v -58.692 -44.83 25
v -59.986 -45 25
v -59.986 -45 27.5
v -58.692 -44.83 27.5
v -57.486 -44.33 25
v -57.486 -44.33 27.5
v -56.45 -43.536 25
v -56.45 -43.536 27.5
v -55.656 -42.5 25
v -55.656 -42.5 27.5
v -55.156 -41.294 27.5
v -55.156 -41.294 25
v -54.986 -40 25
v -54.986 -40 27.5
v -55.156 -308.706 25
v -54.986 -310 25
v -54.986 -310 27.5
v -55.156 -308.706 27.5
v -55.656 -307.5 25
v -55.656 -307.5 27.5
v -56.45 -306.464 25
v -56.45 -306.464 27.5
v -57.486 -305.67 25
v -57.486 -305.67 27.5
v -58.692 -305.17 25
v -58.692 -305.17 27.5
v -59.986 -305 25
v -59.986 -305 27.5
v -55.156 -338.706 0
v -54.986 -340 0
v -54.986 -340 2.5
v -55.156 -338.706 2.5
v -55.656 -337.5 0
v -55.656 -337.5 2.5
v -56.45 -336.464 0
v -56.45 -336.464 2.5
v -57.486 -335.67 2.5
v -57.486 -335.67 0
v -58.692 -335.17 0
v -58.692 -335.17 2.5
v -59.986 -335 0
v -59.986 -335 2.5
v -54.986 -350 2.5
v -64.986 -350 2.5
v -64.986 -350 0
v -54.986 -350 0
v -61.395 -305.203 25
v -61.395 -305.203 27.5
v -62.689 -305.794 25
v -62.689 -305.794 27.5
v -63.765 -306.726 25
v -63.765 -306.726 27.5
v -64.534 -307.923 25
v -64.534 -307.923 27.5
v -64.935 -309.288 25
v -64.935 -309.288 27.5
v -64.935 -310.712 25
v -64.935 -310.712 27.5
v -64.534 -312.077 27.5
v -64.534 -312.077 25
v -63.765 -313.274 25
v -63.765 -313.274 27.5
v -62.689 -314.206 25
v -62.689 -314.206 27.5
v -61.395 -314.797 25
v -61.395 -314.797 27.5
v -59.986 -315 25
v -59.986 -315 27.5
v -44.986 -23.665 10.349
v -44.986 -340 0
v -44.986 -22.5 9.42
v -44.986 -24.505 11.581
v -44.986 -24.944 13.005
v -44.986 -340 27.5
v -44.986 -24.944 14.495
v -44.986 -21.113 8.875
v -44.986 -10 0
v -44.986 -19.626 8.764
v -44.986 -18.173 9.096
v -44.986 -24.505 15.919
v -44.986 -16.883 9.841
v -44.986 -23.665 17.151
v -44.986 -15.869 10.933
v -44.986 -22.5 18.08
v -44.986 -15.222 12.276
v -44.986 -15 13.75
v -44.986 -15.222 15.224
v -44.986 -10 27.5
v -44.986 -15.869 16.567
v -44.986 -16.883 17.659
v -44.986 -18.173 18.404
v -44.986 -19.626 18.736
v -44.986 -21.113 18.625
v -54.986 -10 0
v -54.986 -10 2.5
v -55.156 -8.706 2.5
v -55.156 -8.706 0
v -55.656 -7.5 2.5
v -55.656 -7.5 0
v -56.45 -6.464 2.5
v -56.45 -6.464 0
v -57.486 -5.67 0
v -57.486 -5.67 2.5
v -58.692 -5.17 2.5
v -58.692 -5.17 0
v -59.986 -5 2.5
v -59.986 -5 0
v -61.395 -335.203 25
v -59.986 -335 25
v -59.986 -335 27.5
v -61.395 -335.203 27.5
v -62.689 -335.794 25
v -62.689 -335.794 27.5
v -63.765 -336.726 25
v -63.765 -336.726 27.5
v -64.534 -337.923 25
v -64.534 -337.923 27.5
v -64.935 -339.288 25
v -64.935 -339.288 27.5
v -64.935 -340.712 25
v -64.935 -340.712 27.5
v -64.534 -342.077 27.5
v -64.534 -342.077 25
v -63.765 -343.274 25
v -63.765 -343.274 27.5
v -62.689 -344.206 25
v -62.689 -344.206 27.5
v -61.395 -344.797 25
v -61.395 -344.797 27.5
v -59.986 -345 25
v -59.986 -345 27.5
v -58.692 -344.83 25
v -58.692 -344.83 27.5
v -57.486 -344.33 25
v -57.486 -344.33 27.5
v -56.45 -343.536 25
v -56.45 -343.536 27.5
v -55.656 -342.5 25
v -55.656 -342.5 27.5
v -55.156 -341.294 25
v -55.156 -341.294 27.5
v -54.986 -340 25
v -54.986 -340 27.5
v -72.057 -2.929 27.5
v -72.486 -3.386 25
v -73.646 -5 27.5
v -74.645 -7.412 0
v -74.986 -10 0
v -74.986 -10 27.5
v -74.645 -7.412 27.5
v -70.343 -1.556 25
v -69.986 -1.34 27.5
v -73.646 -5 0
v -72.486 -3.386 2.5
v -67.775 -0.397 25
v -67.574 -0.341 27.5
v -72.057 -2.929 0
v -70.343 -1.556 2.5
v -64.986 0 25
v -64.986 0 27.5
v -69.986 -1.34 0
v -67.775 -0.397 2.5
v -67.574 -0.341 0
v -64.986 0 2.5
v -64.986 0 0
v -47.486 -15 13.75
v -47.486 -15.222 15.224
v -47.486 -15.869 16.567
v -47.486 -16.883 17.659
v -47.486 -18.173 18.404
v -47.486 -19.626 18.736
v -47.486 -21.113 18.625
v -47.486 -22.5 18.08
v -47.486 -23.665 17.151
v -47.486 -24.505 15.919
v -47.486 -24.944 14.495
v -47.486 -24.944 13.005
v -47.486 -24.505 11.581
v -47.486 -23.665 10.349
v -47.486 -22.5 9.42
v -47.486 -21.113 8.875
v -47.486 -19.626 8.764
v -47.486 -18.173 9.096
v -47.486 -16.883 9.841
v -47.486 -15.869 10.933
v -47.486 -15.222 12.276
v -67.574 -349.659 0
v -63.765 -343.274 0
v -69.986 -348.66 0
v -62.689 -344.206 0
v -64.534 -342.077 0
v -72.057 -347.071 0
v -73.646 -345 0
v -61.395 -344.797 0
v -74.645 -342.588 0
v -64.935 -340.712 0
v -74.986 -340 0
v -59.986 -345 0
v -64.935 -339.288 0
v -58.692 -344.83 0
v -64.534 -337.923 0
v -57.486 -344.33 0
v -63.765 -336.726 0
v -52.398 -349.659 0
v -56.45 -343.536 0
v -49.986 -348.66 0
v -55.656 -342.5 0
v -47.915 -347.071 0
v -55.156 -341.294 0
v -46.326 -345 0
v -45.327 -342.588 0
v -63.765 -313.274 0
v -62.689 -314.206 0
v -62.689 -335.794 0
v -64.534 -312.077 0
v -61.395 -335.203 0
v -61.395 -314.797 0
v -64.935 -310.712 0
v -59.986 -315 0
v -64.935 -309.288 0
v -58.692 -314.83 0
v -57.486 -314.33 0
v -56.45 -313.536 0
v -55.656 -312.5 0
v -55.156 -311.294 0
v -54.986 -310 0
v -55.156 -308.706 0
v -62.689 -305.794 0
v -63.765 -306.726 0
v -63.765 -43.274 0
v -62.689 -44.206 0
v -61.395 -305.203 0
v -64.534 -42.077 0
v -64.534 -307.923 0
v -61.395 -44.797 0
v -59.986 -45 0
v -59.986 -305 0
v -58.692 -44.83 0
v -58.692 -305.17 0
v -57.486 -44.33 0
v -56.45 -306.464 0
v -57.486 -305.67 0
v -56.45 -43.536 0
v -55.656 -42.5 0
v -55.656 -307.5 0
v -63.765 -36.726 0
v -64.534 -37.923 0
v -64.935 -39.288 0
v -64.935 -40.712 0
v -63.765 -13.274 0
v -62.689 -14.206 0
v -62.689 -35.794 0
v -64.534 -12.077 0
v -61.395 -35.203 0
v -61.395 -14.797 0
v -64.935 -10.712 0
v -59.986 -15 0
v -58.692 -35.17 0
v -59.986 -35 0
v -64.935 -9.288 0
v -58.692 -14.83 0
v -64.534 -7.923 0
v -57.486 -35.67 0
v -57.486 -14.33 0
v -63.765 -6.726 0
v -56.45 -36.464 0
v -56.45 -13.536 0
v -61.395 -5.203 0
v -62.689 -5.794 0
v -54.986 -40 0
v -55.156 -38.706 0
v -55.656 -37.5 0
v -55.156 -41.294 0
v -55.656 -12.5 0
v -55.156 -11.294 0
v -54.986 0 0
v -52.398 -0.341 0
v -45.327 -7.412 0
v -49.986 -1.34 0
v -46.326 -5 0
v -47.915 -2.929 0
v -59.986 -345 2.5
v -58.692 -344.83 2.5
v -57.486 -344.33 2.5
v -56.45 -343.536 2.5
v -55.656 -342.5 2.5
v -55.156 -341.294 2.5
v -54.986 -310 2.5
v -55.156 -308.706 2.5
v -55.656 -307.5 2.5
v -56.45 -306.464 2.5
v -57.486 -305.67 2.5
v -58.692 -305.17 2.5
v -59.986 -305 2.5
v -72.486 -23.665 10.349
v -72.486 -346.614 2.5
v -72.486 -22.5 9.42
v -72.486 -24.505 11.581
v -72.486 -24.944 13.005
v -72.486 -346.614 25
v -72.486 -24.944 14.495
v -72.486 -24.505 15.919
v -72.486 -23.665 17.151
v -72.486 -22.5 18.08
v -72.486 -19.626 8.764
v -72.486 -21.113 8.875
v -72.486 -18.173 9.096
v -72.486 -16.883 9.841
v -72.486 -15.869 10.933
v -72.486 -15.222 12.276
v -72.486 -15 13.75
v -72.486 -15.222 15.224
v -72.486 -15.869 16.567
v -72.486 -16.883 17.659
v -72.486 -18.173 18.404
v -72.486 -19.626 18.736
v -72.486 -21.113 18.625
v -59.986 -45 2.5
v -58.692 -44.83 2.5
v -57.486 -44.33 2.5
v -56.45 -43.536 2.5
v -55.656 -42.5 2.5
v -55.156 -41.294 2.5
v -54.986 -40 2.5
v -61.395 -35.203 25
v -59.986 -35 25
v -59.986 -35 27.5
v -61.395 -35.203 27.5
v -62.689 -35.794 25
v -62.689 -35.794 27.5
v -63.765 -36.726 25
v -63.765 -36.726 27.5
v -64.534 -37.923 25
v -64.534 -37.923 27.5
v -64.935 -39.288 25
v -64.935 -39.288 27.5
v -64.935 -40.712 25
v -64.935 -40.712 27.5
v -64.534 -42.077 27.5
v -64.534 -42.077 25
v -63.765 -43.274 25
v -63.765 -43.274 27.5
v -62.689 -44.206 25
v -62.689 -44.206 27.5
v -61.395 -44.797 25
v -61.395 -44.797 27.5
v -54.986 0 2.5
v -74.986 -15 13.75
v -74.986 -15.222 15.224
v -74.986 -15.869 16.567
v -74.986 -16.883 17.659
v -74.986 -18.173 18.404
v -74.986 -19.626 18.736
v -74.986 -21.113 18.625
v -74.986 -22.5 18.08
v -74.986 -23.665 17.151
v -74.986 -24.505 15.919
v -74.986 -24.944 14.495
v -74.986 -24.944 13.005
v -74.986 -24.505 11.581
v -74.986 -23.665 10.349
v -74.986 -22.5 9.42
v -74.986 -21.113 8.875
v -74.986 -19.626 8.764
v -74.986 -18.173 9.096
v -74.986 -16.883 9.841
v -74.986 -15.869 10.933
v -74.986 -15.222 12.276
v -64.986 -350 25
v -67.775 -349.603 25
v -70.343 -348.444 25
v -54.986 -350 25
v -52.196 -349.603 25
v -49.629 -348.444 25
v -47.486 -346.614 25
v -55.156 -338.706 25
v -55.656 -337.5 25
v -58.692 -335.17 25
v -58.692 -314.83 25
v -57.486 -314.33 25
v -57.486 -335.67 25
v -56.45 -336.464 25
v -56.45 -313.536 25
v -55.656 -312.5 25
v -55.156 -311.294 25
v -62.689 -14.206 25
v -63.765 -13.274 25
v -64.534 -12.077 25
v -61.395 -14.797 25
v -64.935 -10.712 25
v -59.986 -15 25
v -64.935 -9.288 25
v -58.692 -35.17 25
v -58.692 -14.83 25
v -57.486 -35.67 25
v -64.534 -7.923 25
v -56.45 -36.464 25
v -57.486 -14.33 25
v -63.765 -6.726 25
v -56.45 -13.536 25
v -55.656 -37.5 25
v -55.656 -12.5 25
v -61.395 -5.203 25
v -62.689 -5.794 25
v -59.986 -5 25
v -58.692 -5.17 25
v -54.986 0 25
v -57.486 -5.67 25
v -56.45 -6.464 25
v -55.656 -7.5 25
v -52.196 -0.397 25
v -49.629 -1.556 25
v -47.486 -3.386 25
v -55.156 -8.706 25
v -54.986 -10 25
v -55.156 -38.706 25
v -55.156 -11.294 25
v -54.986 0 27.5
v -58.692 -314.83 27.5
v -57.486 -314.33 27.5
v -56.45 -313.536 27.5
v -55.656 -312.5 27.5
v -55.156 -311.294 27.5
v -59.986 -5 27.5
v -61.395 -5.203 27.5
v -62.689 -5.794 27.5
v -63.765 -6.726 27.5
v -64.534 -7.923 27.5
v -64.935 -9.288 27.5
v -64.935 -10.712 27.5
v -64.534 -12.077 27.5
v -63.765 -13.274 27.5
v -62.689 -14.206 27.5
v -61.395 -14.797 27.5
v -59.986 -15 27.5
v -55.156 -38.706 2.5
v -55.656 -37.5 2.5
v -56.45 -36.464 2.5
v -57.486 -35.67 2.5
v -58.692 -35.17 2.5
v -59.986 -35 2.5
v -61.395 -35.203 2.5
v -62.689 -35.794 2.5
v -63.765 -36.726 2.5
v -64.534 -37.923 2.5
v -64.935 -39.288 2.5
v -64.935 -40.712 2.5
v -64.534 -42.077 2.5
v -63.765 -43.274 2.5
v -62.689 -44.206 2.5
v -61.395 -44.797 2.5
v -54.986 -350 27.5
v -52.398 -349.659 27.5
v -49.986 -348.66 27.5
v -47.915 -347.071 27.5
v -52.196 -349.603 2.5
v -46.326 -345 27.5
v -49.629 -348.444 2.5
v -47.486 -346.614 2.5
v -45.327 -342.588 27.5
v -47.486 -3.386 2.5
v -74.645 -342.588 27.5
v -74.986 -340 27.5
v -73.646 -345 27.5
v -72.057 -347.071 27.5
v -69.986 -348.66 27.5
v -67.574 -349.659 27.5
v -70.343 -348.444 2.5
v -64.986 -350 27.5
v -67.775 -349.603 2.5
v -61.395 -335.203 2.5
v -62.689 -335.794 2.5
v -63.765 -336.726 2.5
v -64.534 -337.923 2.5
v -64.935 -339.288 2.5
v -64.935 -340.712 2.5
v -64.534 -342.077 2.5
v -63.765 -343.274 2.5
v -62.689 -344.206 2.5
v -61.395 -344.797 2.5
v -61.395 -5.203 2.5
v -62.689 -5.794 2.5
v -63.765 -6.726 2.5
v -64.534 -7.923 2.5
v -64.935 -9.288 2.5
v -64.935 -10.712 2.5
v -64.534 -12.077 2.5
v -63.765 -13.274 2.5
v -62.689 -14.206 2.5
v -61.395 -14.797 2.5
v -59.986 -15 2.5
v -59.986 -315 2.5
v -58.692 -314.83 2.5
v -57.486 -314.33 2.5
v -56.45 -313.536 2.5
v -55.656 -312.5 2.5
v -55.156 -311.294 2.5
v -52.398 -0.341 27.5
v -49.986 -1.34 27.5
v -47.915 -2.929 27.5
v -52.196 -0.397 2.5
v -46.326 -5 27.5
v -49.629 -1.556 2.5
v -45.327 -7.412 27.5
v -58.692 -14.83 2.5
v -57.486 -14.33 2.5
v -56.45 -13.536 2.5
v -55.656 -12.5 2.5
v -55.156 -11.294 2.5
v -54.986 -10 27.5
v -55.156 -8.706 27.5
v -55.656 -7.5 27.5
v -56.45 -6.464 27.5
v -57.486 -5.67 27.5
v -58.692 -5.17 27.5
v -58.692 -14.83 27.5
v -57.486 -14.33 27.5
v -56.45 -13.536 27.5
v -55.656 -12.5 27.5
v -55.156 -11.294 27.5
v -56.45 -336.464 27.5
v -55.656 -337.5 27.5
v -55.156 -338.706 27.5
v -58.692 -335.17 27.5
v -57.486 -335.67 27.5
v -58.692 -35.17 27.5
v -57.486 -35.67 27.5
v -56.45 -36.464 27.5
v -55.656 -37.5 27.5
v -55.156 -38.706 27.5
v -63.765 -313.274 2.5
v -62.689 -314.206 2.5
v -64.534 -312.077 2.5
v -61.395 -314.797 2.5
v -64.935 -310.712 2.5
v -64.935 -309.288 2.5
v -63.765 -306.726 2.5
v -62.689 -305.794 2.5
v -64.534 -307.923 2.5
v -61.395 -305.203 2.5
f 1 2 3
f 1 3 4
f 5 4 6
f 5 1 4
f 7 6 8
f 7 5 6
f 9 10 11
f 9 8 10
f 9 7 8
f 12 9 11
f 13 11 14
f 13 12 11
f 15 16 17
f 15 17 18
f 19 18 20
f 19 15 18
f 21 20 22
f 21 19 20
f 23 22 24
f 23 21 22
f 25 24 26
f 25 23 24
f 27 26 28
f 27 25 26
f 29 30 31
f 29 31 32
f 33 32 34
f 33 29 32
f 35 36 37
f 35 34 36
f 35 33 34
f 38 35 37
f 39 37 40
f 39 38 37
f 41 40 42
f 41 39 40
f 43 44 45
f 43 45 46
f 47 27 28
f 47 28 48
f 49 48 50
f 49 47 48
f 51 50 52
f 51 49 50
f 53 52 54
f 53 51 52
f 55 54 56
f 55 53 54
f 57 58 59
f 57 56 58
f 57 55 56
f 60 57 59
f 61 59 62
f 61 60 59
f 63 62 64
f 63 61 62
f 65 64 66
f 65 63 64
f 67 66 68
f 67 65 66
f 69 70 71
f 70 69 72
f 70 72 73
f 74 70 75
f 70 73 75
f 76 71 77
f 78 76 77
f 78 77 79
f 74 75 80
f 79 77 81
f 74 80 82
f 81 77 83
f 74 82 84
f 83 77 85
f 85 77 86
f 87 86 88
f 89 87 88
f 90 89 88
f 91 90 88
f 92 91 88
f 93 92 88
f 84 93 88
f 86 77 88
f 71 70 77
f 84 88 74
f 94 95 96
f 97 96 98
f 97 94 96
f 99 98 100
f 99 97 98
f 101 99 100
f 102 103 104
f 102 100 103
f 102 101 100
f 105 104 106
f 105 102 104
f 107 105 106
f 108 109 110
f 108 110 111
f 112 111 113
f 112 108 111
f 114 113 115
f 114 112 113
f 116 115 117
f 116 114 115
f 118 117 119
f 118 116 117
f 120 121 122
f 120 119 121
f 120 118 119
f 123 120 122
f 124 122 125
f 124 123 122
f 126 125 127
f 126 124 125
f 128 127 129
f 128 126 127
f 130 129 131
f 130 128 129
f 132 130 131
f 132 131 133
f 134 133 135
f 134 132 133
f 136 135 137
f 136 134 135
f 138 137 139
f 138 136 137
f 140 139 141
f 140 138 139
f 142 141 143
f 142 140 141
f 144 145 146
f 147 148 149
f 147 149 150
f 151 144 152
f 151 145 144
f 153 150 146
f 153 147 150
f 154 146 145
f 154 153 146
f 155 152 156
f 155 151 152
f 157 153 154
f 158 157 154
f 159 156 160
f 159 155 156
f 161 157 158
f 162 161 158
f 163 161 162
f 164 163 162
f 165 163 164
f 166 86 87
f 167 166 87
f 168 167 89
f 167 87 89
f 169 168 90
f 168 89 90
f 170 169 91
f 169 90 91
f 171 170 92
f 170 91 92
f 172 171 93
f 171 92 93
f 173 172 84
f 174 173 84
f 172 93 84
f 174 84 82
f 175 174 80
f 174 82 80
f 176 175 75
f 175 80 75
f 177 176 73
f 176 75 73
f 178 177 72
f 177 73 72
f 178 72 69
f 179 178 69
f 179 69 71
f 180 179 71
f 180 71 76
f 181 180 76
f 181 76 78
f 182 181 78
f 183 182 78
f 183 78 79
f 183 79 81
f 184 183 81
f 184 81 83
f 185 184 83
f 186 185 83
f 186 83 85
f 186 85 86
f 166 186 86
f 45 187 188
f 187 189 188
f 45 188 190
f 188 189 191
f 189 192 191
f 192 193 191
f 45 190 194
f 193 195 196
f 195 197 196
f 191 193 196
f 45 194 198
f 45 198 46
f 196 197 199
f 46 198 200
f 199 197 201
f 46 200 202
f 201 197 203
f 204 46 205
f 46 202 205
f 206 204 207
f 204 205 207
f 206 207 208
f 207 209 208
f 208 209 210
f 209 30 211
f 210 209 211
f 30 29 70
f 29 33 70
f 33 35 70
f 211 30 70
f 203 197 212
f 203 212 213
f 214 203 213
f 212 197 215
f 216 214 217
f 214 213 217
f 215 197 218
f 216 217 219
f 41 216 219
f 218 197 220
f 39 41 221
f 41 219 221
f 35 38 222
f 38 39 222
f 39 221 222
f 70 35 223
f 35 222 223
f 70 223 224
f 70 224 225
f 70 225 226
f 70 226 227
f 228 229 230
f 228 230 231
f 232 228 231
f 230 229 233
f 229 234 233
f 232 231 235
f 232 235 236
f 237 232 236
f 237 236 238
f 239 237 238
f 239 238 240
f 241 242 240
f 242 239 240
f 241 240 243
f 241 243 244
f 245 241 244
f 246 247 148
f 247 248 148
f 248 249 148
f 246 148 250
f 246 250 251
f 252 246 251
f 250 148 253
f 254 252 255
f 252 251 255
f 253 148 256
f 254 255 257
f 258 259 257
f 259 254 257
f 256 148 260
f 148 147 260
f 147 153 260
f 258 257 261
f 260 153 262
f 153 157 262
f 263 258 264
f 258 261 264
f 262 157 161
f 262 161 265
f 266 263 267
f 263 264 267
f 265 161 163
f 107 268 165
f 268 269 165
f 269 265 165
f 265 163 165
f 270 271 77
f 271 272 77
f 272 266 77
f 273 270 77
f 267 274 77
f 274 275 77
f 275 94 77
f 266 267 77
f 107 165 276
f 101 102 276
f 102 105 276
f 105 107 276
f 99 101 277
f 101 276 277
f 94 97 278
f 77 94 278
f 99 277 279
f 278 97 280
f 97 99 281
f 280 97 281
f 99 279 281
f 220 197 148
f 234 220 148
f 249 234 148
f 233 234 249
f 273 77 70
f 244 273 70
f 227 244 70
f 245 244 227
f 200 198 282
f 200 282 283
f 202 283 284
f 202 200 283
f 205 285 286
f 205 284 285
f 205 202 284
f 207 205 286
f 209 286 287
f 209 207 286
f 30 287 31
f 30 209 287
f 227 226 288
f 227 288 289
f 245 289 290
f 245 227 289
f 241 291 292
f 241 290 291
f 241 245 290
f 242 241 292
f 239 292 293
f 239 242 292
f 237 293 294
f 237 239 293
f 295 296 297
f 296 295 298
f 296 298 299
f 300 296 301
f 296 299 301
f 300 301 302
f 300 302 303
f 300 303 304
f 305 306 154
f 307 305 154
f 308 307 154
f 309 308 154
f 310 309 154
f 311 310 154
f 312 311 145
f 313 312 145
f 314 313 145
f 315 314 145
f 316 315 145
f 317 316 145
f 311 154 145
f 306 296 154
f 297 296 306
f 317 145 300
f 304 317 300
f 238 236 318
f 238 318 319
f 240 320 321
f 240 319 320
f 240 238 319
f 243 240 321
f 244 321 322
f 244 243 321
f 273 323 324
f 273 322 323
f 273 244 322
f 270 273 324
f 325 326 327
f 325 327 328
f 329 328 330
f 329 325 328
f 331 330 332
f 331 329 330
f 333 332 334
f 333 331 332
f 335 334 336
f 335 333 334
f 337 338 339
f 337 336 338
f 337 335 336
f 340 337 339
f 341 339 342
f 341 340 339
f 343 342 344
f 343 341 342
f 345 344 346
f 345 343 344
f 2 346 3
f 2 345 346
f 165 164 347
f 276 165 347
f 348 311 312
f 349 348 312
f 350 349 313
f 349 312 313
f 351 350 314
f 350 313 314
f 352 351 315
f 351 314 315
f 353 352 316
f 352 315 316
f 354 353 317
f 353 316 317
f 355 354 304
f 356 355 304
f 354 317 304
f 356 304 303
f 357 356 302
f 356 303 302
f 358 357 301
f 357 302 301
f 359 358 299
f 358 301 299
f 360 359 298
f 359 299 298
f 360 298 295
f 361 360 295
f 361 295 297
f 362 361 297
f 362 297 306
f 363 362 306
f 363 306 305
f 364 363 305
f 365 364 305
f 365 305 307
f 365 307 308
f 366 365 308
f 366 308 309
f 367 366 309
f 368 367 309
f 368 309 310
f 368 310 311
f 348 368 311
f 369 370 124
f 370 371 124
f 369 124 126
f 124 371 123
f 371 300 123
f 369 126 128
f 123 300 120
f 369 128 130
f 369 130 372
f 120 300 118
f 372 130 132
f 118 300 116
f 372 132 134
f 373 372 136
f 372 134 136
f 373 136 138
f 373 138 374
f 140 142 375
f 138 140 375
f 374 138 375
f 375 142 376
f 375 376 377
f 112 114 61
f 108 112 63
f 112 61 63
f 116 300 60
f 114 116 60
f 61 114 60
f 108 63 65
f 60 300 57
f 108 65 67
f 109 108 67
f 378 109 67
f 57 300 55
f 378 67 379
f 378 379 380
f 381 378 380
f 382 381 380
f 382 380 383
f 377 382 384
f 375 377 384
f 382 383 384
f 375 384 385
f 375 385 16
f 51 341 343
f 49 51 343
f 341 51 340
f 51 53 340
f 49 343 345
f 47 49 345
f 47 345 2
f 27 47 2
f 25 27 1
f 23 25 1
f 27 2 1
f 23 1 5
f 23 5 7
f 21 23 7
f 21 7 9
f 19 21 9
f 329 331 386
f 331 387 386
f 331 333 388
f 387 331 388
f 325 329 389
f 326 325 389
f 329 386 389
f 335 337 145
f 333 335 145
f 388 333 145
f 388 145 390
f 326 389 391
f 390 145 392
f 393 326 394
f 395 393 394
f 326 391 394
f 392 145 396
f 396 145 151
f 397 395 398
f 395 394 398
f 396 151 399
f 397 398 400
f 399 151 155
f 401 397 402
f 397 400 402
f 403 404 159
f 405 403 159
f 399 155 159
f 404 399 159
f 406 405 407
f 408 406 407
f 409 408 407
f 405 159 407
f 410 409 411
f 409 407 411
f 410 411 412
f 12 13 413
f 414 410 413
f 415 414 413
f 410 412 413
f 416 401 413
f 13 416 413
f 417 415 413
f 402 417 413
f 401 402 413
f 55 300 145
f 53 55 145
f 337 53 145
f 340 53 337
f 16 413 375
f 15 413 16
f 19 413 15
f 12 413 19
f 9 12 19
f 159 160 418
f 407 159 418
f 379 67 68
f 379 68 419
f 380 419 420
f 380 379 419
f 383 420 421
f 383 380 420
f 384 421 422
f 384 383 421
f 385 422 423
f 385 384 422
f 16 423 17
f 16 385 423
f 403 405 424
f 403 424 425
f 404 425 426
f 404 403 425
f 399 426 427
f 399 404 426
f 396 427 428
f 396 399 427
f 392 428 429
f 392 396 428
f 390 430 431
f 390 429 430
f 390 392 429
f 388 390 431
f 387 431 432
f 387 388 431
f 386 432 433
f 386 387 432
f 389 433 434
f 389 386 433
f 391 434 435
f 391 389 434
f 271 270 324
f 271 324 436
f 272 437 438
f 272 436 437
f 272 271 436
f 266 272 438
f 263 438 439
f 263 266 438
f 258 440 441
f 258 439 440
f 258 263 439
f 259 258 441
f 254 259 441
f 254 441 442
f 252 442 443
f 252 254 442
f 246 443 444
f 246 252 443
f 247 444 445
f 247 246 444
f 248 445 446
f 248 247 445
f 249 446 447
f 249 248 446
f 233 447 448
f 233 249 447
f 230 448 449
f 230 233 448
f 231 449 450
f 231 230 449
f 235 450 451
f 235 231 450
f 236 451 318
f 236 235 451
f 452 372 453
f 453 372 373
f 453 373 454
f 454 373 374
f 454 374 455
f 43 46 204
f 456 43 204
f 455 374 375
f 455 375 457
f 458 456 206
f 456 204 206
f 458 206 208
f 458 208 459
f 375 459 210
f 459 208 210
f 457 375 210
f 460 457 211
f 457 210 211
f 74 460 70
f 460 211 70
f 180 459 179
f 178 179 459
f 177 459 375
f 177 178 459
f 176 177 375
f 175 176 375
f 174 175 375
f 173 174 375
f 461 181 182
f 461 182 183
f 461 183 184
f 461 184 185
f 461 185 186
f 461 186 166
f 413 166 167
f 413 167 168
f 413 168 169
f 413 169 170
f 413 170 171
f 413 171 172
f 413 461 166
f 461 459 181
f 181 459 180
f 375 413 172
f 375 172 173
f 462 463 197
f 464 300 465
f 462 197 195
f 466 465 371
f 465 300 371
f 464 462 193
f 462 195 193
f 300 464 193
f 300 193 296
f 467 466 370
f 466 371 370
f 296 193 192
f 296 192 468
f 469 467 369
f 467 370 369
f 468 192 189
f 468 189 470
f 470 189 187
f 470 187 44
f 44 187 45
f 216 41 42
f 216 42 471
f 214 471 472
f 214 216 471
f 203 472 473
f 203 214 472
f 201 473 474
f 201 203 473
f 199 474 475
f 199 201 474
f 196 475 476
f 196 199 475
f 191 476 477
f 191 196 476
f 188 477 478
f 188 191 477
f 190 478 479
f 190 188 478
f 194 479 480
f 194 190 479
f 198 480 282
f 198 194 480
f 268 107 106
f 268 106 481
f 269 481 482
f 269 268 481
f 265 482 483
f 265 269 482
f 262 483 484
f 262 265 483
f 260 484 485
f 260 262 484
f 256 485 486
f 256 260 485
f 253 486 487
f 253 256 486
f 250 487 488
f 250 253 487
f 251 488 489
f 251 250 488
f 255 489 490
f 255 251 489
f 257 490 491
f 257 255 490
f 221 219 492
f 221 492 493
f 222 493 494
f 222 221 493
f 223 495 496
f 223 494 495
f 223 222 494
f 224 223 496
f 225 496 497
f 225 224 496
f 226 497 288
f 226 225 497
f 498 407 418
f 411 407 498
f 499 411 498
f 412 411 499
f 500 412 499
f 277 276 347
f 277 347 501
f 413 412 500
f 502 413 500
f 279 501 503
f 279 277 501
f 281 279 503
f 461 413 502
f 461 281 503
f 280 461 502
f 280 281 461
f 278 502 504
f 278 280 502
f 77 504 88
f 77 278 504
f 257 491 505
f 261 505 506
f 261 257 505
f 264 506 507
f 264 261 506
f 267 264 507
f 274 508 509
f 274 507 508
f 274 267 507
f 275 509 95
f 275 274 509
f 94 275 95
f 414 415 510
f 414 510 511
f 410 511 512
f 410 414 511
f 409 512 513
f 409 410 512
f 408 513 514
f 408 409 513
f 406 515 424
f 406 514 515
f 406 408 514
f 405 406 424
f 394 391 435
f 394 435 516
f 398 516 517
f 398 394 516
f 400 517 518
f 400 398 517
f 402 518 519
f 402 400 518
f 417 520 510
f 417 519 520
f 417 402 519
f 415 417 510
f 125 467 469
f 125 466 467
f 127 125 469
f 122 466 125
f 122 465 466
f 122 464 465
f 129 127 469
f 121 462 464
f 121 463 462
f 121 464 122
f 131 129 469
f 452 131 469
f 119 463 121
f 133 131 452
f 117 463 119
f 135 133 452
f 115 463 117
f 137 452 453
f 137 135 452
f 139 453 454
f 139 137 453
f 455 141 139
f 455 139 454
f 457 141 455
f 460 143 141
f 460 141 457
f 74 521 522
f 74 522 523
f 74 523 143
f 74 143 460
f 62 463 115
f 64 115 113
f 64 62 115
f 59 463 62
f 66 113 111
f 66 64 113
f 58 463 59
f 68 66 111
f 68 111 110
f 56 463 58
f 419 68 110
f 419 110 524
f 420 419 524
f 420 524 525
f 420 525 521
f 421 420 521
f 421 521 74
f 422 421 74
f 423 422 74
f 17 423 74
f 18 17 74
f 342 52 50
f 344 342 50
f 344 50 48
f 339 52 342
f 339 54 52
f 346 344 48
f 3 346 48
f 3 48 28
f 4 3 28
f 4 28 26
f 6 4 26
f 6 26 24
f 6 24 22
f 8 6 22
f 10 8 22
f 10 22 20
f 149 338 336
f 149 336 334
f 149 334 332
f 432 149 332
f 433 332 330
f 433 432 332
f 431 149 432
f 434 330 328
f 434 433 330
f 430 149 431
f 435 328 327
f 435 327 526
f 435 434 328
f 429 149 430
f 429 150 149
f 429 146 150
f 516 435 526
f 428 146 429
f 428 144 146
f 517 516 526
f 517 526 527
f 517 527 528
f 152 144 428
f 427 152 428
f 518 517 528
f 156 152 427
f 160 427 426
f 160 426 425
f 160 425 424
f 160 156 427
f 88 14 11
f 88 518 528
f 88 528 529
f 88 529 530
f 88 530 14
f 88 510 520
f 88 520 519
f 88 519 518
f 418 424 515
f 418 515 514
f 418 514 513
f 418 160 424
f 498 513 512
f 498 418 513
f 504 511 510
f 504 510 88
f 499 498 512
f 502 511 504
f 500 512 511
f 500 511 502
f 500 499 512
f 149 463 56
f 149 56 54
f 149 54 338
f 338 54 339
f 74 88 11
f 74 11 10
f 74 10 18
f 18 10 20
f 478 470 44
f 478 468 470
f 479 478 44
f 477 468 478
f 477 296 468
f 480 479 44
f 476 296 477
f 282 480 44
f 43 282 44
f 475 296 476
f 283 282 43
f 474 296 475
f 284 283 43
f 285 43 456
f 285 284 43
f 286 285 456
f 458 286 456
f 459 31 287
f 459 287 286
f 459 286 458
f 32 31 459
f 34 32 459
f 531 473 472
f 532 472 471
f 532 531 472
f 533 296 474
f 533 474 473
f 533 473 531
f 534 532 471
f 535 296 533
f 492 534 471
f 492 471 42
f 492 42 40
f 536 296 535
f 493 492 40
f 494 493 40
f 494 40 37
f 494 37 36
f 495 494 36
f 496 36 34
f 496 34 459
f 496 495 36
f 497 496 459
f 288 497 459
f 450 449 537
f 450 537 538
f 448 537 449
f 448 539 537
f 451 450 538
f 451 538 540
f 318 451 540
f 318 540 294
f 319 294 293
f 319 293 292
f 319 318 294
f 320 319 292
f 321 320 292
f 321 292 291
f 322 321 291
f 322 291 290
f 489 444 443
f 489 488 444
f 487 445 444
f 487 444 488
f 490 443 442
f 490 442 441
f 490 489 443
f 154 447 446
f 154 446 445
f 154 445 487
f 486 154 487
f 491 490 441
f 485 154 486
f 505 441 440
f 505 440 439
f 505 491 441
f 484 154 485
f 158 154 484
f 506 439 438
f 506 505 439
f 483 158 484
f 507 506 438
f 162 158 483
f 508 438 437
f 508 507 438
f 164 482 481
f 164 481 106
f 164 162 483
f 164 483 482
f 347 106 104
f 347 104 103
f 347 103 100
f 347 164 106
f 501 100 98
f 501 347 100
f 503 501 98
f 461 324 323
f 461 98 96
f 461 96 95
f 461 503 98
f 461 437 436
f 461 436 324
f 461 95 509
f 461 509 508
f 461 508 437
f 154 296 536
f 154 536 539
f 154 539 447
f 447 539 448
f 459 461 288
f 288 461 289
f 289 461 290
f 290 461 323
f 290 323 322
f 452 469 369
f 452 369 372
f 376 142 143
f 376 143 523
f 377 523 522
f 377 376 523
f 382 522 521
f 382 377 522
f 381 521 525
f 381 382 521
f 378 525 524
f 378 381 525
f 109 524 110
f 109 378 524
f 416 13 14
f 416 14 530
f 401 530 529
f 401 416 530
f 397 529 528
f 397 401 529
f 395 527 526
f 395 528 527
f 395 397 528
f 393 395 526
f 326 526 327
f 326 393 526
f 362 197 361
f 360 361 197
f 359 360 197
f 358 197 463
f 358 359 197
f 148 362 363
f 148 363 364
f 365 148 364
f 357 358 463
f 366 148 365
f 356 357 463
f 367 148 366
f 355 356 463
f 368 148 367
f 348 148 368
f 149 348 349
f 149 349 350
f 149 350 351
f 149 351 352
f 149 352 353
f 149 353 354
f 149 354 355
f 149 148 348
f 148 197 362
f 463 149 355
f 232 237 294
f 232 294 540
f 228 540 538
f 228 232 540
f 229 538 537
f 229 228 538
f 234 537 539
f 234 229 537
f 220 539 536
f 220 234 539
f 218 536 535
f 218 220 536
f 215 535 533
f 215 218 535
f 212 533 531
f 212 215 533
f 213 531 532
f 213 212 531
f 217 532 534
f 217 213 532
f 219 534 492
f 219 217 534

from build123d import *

# Parameters (mm, degrees)
F0_W        = 30
F0_H        = 27.5
F0_W_2      = 25
F0_H_2      = 22.5
F1_DEPTH    = 350
F3_DEPTH    = 53
F4_T1_DEPTH = 77.5
F5_R        = 5
F6_DEPTH    = 37.8


# Not quite as in the source:
# - a fillet or chamfer that OpenCascade refuses, or shapes differently, is made with other operations: its cross-section is extruded or revolved along the edge and cut away or added
# - a feature names something its author has since deleted; it is built from what else it names


with BuildPart() as f1:
    # F0 (on Front) → F1 (new body)
    with BuildSketch(Plane.XZ):
        with Locations((-59.9858543277, 13.75)):
            Rectangle(F0_W, F0_H)
        with Locations((-59.9858543277, 13.75)):
            Rectangle(F0_W_2, F0_H_2, mode=Mode.SUBTRACT)
    extrude(amount=F1_DEPTH)

    # F2 (on Top) → F3 (cut)
    with BuildSketch(Plane.XY):
        with BuildLine():
            Line((-59.9858543277, -340), (-59.9858543277, -335))
            ThreePointArc((-59.9858543277, -335), (-64.9858543277, -340), (-59.9858543277, -345))
            Line((-59.9858543277, -345), (-59.9858543277, -340))
        make_face()
        with BuildLine():
            ThreePointArc((-54.9858543277, -340), (-56.4503204217, -336.4644660941), (-59.9858543277, -335))
            Line((-59.9858543277, -335), (-59.9858543277, -340))
            Line((-59.9858543277, -340), (-59.9858543277, -345))
            ThreePointArc((-59.9858543277, -345), (-56.4503204217, -343.5355339059), (-54.9858543277, -340))
        make_face()
        with BuildLine():
            Line((-59.9858543277, -45), (-59.9858543277, -35))
            ThreePointArc((-59.9858543277, -35), (-64.9858543277, -40), (-59.9858543277, -45))
        make_face()
        with BuildLine():
            ThreePointArc((-54.9858543277, -40), (-56.4503204217, -36.4644660941), (-59.9858543277, -35))
            Line((-59.9858543277, -35), (-59.9858543277, -45))
            ThreePointArc((-59.9858543277, -45), (-56.4503204217, -43.5355339059), (-54.9858543277, -40))
        make_face()
        with BuildLine():
            Line((-59.9858543277, -15), (-59.9858543277, -5))
            ThreePointArc((-59.9858543277, -5), (-64.9858543277, -10), (-59.9858543277, -15))
        make_face()
        with BuildLine():
            ThreePointArc((-59.9858543277, -15), (-56.4503204217, -13.5355339059), (-54.9858543277, -10))
            ThreePointArc((-54.9858543277, -10), (-56.4503204217, -6.4644660941), (-59.9858543277, -5))
            Line((-59.9858543277, -5), (-59.9858543277, -15))
        make_face()
        with BuildLine():
            Line((-59.9858543277, -315), (-59.9858543277, -305))
            ThreePointArc((-59.9858543277, -305), (-64.9858543277, -310), (-59.9858543277, -315))
        make_face()
        with BuildLine():
            ThreePointArc((-54.9858543277, -310), (-56.4503204217, -306.4644660941), (-59.9858543277, -305))
            Line((-59.9858543277, -305), (-59.9858543277, -315))
            ThreePointArc((-59.9858543277, -315), (-56.4503204217, -313.5355339059), (-54.9858543277, -310))
        make_face()
    extrude(amount=F3_DEPTH, mode=Mode.SUBTRACT)

    # F4: fillet of radius 10 on 4 edges, made by hand

    # F4_s2 → F4_t1 (cut)
    with BuildSketch(Plane.XY.offset(-25)):
        with BuildLine():
            ThreePointArc((-74.9858543277, -10), (-72.0569221395, -2.9289321881), (-64.9858543277, 0))
            Line((-64.9858543277, 0), (-74.9858543277, 0))
            Line((-74.9858543277, 0), (-74.9858543277, -10))
        make_face()
        with BuildLine():
            ThreePointArc((-74.9858543277, -340), (-72.0569221395, -347.0710678119), (-64.9858543277, -350))
            Line((-64.9858543277, -350), (-74.9858543277, -350))
            Line((-74.9858543277, -350), (-74.9858543277, -340))
        make_face()
        with BuildLine():
            ThreePointArc((-54.9858543277, 0), (-47.9147865158, -2.9289321881), (-44.9858543277, -10))
            Line((-44.9858543277, -10), (-44.9858543277, 0))
            Line((-44.9858543277, 0), (-54.9858543277, 0))
        make_face()
        with BuildLine():
            ThreePointArc((-54.9858543277, -350), (-47.9147865158, -347.0710678119), (-44.9858543277, -340))
            Line((-44.9858543277, -340), (-44.9858543277, -350))
            Line((-44.9858543277, -350), (-54.9858543277, -350))
        make_face()
    extrude(amount=F4_T1_DEPTH, mode=Mode.SUBTRACT)

    # F5 (on face) → F6 (cut)
    with BuildSketch(Plane.YZ.offset(-44.9858543277)):
        with Locations((-20, 13.75)):
            Circle(F5_R)
    extrude(amount=-F6_DEPTH, mode=Mode.SUBTRACT)


solid = f1.part
